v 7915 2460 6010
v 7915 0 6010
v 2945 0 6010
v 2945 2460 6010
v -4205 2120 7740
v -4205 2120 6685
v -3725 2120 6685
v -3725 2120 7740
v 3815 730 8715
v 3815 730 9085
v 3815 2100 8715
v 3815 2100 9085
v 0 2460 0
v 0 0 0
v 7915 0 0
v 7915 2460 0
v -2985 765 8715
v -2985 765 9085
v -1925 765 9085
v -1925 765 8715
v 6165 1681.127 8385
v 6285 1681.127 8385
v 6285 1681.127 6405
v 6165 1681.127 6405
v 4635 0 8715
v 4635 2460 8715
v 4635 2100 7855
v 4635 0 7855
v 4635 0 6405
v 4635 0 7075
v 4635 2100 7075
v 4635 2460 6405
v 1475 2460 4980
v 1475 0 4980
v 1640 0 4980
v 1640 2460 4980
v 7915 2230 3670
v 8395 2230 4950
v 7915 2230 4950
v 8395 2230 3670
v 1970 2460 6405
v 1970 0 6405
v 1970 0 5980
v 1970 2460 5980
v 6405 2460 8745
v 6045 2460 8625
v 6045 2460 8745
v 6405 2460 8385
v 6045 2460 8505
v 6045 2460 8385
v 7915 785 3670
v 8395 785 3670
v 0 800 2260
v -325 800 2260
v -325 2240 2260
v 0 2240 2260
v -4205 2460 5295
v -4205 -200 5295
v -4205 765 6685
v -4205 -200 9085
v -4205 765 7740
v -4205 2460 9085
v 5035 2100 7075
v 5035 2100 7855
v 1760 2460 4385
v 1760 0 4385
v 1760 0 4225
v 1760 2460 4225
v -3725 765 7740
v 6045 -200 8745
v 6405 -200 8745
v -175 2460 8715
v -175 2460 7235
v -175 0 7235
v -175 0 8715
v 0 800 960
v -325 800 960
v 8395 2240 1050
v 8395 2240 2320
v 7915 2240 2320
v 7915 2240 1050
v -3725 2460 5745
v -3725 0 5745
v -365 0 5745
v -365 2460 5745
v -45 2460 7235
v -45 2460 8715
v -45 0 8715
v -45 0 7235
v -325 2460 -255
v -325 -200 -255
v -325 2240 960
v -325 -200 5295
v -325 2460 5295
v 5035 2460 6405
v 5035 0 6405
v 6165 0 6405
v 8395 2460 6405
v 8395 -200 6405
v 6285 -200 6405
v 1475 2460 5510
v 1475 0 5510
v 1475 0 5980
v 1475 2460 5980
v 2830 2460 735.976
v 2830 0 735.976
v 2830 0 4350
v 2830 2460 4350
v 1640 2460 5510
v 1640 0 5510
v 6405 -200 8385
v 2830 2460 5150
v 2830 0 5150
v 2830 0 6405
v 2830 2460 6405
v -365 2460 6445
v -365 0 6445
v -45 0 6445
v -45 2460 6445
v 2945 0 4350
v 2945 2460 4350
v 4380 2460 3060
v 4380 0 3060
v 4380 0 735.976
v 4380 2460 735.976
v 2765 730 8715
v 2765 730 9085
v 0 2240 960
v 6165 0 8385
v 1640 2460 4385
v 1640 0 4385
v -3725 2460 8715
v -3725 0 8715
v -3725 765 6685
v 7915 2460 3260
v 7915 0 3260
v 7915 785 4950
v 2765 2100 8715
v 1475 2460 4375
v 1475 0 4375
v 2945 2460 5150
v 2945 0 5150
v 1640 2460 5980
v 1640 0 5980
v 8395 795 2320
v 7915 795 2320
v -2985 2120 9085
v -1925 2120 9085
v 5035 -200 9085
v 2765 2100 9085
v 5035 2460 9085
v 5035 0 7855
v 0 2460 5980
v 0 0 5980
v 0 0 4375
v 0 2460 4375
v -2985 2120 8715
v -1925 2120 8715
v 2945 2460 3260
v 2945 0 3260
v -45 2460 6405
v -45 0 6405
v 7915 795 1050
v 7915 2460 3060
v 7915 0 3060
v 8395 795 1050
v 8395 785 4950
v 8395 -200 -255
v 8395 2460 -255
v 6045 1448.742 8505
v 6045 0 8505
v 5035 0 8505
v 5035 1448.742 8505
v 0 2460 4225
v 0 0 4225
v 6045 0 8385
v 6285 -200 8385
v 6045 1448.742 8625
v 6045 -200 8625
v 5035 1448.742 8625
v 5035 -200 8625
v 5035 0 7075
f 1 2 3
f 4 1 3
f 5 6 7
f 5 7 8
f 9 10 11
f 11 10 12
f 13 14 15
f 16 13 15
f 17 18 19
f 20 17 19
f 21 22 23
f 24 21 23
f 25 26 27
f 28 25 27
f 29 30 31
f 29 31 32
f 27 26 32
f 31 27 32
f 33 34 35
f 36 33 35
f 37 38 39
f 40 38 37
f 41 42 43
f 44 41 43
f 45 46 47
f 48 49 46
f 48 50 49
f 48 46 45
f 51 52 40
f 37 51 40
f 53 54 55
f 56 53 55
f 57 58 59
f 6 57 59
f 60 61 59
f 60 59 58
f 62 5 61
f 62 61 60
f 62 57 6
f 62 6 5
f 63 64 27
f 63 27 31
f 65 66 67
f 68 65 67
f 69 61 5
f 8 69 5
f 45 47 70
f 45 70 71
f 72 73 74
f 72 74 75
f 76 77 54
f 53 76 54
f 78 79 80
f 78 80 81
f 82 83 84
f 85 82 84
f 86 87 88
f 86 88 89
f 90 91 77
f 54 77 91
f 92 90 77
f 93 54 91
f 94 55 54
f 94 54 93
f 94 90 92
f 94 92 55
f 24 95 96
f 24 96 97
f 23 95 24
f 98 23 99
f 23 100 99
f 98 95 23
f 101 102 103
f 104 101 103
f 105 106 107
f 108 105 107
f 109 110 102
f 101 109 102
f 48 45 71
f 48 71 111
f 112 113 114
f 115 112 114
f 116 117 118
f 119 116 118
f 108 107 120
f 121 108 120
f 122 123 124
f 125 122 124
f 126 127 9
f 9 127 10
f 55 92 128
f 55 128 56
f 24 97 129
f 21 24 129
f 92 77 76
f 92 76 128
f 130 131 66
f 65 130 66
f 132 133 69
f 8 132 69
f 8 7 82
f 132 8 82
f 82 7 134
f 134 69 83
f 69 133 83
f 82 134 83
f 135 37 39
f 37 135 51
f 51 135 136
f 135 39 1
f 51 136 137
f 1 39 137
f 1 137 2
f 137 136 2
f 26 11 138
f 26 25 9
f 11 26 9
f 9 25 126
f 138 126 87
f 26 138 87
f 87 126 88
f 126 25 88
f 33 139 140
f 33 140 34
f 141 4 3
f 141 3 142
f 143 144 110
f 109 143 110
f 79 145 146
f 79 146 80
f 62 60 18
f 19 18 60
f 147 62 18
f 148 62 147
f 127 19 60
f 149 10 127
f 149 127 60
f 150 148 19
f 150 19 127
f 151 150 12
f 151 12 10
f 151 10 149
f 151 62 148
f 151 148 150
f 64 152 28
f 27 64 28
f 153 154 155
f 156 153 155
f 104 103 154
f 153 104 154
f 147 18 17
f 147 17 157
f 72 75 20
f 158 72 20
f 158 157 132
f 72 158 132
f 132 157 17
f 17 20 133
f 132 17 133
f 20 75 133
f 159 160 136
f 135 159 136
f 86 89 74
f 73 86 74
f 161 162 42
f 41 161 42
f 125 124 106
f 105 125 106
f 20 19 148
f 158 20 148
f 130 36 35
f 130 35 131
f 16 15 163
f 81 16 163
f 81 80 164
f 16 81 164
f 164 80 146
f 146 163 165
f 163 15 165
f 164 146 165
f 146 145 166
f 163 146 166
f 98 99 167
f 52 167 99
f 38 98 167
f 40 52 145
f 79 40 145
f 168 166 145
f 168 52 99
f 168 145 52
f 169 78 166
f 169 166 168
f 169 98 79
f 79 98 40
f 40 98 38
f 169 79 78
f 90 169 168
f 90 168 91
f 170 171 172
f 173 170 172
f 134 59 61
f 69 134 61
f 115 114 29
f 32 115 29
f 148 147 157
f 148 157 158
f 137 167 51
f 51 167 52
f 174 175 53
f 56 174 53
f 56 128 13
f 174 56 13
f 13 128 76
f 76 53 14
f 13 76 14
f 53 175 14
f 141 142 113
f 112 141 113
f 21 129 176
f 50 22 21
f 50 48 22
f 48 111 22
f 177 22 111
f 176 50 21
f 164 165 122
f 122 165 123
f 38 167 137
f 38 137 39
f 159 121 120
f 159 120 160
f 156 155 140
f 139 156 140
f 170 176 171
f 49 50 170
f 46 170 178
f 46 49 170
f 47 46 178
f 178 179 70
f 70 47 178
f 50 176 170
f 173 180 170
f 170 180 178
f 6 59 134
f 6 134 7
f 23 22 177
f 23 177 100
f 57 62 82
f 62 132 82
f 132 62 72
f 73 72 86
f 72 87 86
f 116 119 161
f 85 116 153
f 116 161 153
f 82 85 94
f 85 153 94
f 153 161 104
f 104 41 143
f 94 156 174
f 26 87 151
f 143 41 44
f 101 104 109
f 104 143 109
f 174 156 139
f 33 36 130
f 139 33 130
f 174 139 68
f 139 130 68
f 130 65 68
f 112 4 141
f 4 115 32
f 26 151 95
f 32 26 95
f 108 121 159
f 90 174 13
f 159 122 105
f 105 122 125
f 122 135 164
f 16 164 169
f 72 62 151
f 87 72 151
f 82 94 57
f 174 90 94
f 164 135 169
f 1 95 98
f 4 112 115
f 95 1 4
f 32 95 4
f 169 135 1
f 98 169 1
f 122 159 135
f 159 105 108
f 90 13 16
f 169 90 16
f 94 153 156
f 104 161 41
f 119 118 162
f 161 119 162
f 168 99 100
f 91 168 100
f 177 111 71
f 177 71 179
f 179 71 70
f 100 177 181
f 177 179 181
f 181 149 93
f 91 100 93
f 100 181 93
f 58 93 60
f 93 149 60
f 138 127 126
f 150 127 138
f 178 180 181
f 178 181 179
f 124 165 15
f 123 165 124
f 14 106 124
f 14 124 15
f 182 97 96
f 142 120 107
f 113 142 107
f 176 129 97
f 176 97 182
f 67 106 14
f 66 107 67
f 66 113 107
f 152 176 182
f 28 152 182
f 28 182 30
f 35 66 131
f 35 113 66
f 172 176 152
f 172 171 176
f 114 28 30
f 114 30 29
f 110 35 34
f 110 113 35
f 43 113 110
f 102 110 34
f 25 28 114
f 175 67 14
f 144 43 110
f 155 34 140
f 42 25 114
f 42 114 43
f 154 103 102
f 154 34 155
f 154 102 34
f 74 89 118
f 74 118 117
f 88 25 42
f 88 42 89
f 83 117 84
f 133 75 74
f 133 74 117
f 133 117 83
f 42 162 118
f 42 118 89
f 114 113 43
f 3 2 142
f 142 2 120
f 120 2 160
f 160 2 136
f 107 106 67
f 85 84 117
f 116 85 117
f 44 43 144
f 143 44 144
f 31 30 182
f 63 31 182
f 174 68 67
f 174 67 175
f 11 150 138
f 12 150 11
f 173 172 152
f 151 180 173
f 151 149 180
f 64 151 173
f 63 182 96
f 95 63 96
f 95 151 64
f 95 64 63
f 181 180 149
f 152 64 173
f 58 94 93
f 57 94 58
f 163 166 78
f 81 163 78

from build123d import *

# Parameters (mm, degrees)
EXTRUDE_1_DEPTH     = 2460
EXTRUDE_2_DEPTH     = 200
CUT_EXTRUDE_1_REACH = 12467.233
SKETCH_3_W          = 1010
SKETCH_3_H          = 1011.258012307
CUT_EXTRUDE_2_REACH = 14095.577
SKETCH_4_W          = 1980
SKETCH_4_H          = 778.873385884
SKETCH_5_W          = 780
SKETCH_5_H          = 360
EXTRUDE_3_DEPTH     = 400
CUT_EXTRUDE_3_REACH = 12799.001
SKETCH_6_W          = 1050
SKETCH_6_H          = 1370
SKETCH_6_W_2        = 1060
SKETCH_6_H_2        = 1355
CUT_EXTRUDE_4_REACH = 15729.327
SKETCH_7_W          = 1055
SKETCH_7_H          = 1355
CUT_EXTRUDE_5_REACH = 12832.714
SKETCH_8_W          = 1300
SKETCH_8_H          = 1440
CUT_EXTRUDE_6_REACH = 15729.327
SKETCH_9_W          = 1280
SKETCH_9_H          = 1445
SKETCH_9_W_2        = 1270


with BuildPart() as part:
    # Эскиз1 → Бобышка-Вытянуть1 (new body)
    with BuildSketch(Plane(origin=(0, 0, 0), x_dir=(1, 0, 0), z_dir=(0, 1, 0))):
        Polygon((6045, -8625), (6045, -8745), (6405, -8745), (6405, -8385), (6285, -8385), (6285, -6405), (8395, -6405), (8395, 255), (-325, 255), (-325, -5295), (-4205, -5295), (-4205, -9085), (5035, -9085), (5035, -8625), align=None)
        Polygon((0, 0), (7823.261739164, 0), (7915, 0), (7915, -3060), (4380, -3060), (4380, -735.975609756), (4230, -735.975609756), (3000, -735.975609756), (2830, -735.975609756), (2830, -4350), (2945, -4350), (2945, -3260), (7915, -3260), (7915, -6010), (2945, -6010), (2945, -5150), (2830, -5150), (2830, -6010), (2830, -6405), (4635, -6405), (4635, -7075), (5035, -7075), (5035, -6405), (6165, -6405), (6165, -8385), (6045, -8385), (6045, -8505), (5035, -8505), (5035, -7855), (4635, -7855), (4635, -8715), (-45, -8715), (-45, -7235), (-175, -7235), (-175, -8715), (-3725, -8715), (-3725, -5745), (-365, -5745), (-365, -6445), (-45, -6445), (-45, -6405), (1970, -6405), (1970, -5980), (1640, -5980), (1640, -5510), (1475, -5510), (1475, -5980), (0, -5980), (0, -4375), (1475, -4375), (1475, -4980), (1640, -4980), (1640, -4385), (1760, -4385), (1760, -4225), (0, -4225), align=None, mode=Mode.SUBTRACT)
    extrude(amount=EXTRUDE_1_DEPTH)

    # Эскиз2 → Бобышка-Вытянуть2 (add)
    with BuildSketch(Plane.XZ):
        Polygon((-4205, 5295), (-4205, 9085), (5035, 9085), (5035, 8625), (6045, 8625), (6045, 8745), (6405, 8745), (6405, 8385), (6285, 8385), (6285, 6405), (8395, 6405), (8395, -255), (-325, -255), (-325, 5295), align=None)
    extrude(amount=EXTRUDE_2_DEPTH)

    # Эскиз3 → Вырез-Вытянуть1 (cut, up to next)
    with BuildSketch(Plane.XY.offset(8625), mode=Mode.PRIVATE) as cut_extrude_1_sk1:
        with Locations((5540, 1954.370993846)):
            Rectangle(SKETCH_3_W, SKETCH_3_H)
    cut_extrude_1_tool1 = extrude(cut_extrude_1_sk1.sketch, amount=-CUT_EXTRUDE_1_REACH, mode=Mode.PRIVATE) & part.part
    add(cut_extrude_1_tool1.solids().sort_by_distance((5540, 1954.370994, 8625))[0], mode=Mode.SUBTRACT)

    # Эскиз4 → Вырез-Вытянуть2 (cut, up to next)
    with BuildSketch(Plane(origin=(6285, 0, 0), x_dir=(0, 0, -1), z_dir=(1, 0, 0)), mode=Mode.PRIVATE) as cut_extrude_2_sk1:
        with Locations((-7395, 2070.563307058)):
            Rectangle(SKETCH_4_W, SKETCH_4_H)
    cut_extrude_2_tool1 = extrude(cut_extrude_2_sk1.sketch, amount=-CUT_EXTRUDE_2_REACH, mode=Mode.PRIVATE) & part.part
    add(cut_extrude_2_tool1.solids().sort_by_distance((6285, 2070.563307, 7395))[0], mode=Mode.SUBTRACT)

    # Эскиз5 → Бобышка-Вытянуть3 (add)
    with BuildSketch(Plane(origin=(5035, 0, 0), x_dir=(0, 0, -1), z_dir=(1, 0, 0))):
        with Locations((-7465, 2280)):
            Rectangle(SKETCH_5_W, SKETCH_5_H)
    extrude(amount=-EXTRUDE_3_DEPTH)

    # Эскиз6 → Вырез-Вытянуть3 (cut, up to next)
    with BuildSketch(Plane.XY.offset(9085), mode=Mode.PRIVATE) as cut_extrude_3_sk1:
        with Locations((3290, 1415)):
            Rectangle(SKETCH_6_W, SKETCH_6_H)
    cut_extrude_3_tool1 = extrude(cut_extrude_3_sk1.sketch, amount=-CUT_EXTRUDE_3_REACH, mode=Mode.PRIVATE) & part.part
    # Эскиз6 → Вырез-Вытянуть3 (cut, up to next)
    with BuildSketch(Plane.XY.offset(9085), mode=Mode.PRIVATE) as cut_extrude_3_sk2:
        with Locations((-2455, 1442.5)):
            Rectangle(SKETCH_6_W_2, SKETCH_6_H_2)
    cut_extrude_3_tool2 = extrude(cut_extrude_3_sk2.sketch, amount=-CUT_EXTRUDE_3_REACH, mode=Mode.PRIVATE) & part.part
    add(cut_extrude_3_tool1.solids().sort_by_distance((3290, 1415, 9085))[0], mode=Mode.SUBTRACT)
    add(cut_extrude_3_tool2.solids().sort_by_distance((-2455, 1442.5, 9085))[0], mode=Mode.SUBTRACT)

    # Эскиз7 → Вырез-Вытянуть4 (cut, up to next)
    with BuildSketch(Plane.ZY.offset(4205), mode=Mode.PRIVATE) as cut_extrude_4_sk1:
        with Locations((7212.5, 1442.5)):
            Rectangle(SKETCH_7_W, SKETCH_7_H)
    cut_extrude_4_tool1 = extrude(cut_extrude_4_sk1.sketch, amount=-CUT_EXTRUDE_4_REACH, mode=Mode.PRIVATE) & part.part
    add(cut_extrude_4_tool1.solids().sort_by_distance((-4205, 1442.5, 7212.5))[0], mode=Mode.SUBTRACT)

    # Эскиз8 → Вырез-Вытянуть5 (cut, up to next)
    with BuildSketch(Plane.ZY.offset(325), mode=Mode.PRIVATE) as cut_extrude_5_sk1:
        with Locations((1610, 1520)):
            Rectangle(SKETCH_8_W, SKETCH_8_H)
    cut_extrude_5_tool1 = extrude(cut_extrude_5_sk1.sketch, amount=-CUT_EXTRUDE_5_REACH, mode=Mode.PRIVATE) & part.part
    add(cut_extrude_5_tool1.solids().sort_by_distance((-325, 1520, 1610))[0], mode=Mode.SUBTRACT)

    # Эскиз9 → Вырез-Вытянуть6 (cut, up to next)
    with BuildSketch(Plane(origin=(8395, 0, 0), x_dir=(0, 0, -1), z_dir=(1, 0, 0)), mode=Mode.PRIVATE) as cut_extrude_6_sk1:
        with Locations((-4310, 1507.5)):
            Rectangle(SKETCH_9_W, SKETCH_9_H)
    cut_extrude_6_tool1 = extrude(cut_extrude_6_sk1.sketch, amount=-CUT_EXTRUDE_6_REACH, mode=Mode.PRIVATE) & part.part
    # Эскиз9 → Вырез-Вытянуть6 (cut, up to next)
    with BuildSketch(Plane(origin=(8395, 0, 0), x_dir=(0, 0, -1), z_dir=(1, 0, 0)), mode=Mode.PRIVATE) as cut_extrude_6_sk2:
        with Locations((-1685, 1517.5)):
            Rectangle(SKETCH_9_W_2, SKETCH_9_H)
    cut_extrude_6_tool2 = extrude(cut_extrude_6_sk2.sketch, amount=-CUT_EXTRUDE_6_REACH, mode=Mode.PRIVATE) & part.part
    add(cut_extrude_6_tool1.solids().sort_by_distance((8395, 1507.5, 4310))[0], mode=Mode.SUBTRACT)
    add(cut_extrude_6_tool2.solids().sort_by_distance((8395, 1517.5, 1685))[0], mode=Mode.SUBTRACT)


solid = part.part
